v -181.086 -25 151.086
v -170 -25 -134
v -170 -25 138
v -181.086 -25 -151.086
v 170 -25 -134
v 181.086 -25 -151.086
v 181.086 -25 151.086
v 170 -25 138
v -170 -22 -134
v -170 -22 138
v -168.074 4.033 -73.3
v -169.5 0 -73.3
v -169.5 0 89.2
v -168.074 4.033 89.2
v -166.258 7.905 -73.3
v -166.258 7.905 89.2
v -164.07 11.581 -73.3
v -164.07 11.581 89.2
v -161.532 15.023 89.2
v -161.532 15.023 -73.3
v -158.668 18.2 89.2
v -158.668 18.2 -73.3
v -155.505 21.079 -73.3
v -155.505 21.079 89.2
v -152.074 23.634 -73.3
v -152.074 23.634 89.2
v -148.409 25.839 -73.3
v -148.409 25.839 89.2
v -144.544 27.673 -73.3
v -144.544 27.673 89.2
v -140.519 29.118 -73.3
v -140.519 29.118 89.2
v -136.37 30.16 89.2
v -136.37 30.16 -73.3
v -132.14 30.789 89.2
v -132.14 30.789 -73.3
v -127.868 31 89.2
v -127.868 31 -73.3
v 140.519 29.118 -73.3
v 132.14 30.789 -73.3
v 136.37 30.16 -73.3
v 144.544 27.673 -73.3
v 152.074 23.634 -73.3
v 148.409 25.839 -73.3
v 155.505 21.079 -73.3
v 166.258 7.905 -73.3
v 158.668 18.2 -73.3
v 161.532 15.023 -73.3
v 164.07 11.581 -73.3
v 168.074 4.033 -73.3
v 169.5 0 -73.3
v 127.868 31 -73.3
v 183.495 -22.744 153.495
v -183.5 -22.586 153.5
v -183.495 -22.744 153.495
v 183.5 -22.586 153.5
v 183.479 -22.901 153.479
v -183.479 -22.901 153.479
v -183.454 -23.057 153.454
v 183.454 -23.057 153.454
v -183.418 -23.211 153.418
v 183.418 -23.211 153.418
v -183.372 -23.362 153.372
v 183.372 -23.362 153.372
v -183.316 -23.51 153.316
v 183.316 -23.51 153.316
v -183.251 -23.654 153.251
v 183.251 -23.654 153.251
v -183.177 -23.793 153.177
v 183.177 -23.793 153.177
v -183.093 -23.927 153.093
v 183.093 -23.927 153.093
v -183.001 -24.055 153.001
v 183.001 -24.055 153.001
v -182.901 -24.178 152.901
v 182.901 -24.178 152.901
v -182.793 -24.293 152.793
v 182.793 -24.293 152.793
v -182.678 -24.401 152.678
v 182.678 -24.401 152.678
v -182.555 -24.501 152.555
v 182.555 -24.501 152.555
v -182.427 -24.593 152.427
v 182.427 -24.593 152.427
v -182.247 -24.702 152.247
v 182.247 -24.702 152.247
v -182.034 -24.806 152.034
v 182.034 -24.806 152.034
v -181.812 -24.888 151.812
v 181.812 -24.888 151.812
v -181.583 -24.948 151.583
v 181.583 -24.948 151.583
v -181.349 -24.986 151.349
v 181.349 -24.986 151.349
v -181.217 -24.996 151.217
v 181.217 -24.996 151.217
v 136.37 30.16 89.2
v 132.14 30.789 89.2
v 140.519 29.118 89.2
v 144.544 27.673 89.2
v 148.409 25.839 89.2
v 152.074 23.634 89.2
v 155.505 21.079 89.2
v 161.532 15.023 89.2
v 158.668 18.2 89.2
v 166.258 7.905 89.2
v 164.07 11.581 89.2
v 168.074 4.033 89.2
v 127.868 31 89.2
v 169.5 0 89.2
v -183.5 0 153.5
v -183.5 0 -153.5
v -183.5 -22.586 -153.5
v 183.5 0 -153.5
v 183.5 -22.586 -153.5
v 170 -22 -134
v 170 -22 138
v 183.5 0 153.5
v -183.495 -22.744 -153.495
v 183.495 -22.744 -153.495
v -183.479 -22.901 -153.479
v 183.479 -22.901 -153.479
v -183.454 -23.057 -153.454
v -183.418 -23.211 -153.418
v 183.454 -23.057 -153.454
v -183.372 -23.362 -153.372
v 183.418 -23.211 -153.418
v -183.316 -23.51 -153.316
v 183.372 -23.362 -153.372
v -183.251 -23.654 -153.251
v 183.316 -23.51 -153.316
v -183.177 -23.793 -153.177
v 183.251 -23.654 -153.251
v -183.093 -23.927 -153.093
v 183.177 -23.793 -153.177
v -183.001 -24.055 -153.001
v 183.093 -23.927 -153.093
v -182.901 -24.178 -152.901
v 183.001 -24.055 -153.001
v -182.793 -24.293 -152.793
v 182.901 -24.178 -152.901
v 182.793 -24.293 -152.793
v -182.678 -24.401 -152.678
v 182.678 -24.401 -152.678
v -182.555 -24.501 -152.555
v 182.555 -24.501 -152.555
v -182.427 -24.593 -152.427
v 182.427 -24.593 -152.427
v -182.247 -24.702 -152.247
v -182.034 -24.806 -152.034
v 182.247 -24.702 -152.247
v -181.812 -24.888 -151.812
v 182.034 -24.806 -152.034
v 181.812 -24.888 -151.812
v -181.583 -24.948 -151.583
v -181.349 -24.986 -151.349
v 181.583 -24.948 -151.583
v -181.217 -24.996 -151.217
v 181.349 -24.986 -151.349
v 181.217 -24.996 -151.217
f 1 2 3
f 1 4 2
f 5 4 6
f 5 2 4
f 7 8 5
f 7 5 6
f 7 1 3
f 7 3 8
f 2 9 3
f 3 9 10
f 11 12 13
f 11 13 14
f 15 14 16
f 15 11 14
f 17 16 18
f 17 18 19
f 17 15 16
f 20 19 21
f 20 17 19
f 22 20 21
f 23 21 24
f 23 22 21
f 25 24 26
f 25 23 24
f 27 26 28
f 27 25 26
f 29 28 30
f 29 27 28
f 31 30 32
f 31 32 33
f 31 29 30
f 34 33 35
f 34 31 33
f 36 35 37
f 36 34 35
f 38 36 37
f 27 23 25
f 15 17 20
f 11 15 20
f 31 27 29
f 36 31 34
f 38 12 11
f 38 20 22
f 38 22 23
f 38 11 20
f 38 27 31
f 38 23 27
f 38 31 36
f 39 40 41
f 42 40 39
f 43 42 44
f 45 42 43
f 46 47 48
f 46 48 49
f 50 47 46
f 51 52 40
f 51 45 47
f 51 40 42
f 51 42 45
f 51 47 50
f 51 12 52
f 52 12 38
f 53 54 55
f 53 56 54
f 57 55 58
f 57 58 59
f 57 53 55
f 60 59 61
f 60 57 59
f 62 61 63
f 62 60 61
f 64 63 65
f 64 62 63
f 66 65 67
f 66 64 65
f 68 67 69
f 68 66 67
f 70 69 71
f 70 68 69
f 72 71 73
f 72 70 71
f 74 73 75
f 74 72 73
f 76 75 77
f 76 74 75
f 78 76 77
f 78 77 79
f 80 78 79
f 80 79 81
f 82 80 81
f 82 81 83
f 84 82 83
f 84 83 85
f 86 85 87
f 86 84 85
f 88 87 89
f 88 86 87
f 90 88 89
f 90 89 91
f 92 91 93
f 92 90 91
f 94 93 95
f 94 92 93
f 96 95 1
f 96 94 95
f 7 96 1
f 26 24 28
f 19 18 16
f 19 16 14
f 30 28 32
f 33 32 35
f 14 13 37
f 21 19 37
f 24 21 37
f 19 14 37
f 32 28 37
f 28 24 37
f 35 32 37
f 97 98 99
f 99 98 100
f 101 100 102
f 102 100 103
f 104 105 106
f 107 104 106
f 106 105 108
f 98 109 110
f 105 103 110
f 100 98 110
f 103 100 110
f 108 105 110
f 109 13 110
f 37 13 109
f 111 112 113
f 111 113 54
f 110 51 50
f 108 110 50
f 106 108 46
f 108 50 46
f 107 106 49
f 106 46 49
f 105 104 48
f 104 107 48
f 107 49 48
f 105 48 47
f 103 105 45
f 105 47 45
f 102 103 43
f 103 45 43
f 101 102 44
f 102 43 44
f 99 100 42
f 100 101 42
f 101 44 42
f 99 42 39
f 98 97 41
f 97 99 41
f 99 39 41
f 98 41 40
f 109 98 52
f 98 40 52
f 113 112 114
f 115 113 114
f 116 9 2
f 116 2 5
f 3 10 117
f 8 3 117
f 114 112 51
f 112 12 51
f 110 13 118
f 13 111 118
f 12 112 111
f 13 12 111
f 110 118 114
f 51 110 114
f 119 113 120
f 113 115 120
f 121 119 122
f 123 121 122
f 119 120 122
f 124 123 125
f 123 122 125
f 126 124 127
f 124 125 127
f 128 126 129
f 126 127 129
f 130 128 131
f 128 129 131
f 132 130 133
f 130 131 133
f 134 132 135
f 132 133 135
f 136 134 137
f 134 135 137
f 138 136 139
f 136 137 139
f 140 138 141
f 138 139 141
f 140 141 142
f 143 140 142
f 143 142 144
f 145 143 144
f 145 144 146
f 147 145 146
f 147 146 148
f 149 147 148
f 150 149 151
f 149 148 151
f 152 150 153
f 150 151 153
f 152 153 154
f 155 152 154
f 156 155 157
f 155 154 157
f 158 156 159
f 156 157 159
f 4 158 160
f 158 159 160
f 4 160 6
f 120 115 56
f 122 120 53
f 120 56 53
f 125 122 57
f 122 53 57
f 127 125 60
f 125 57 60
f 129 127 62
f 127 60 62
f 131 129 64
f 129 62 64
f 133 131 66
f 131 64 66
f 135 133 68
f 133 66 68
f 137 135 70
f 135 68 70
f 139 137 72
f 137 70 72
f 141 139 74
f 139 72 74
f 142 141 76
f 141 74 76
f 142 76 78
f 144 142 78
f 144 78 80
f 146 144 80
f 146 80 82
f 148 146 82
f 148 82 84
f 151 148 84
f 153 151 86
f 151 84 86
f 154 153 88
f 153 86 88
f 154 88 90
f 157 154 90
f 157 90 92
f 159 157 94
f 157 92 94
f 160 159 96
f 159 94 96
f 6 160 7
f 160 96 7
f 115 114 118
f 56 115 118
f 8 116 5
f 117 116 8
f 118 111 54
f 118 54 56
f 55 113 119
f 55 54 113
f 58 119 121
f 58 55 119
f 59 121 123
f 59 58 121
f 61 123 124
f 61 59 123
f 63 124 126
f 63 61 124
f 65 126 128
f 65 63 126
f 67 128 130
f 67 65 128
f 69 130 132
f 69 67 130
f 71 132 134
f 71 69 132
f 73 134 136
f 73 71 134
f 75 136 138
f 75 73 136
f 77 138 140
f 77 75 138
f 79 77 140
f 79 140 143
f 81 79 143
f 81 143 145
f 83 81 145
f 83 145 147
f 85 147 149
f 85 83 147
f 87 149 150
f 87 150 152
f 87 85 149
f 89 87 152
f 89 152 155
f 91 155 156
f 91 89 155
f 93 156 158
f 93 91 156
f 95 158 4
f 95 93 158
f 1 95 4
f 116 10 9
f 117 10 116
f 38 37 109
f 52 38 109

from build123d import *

# Parameters (mm, degrees)
F0_W        = 367
F0_H        = 307
F0_W_2      = 340
F0_H_2      = 272
F1_DEPTH    = 25
F2_DEPTH    = 22
F3_R        = 2.4142135624
F4_W        = 339
F4_H        = 162.5
F5_DEPTH    = 31
F6_T1_DEPTH = 370.6623366275


# Not quite as in the source:
# - a fillet or chamfer that OpenCascade refuses, or shapes differently, is made with other operations: its cross-section is extruded or revolved along the edge and cut away or added


with BuildPart() as f1:
    # F0 (on Front) → F1 (new body)
    with BuildSketch(Plane.XZ):
        Rectangle(F0_W, F0_H)
        with Locations((0, 2)):
            Rectangle(F0_W_2, F0_H_2, mode=Mode.SUBTRACT)
    extrude(amount=F1_DEPTH)

    # F0 (on Front) → F2 (join)
    with BuildSketch(Plane.XZ):
        with Locations((0, 2)):
            Rectangle(F0_W_2, F0_H_2)
    extrude(amount=F2_DEPTH)

    # F3
    f3_edges = [f1.edges().sort_by_distance(p)[0] for p in [
        (-183.5, -25, 0),
        (183.5, -25, 0),
        (0, -25, 153.5),
        (0, -25, -153.5),
    ]]
    fillet(f3_edges, radius=F3_R)

    # F4 (on face) → F5 (join)
    with BuildSketch(Plane.XZ):
        with Locations((0, 7.95)):
            Rectangle(F4_W, F4_H)
    extrude(amount=-F5_DEPTH)

    # F6: fillet of radius 43.4558441227 on 2 edges, made by hand

    # F6_s2 → F6_t1 (cut)
    with BuildSketch(Plane.XY.offset(-177.3811683137)):
        with BuildLine():
            ThreePointArc((169.5, 0), (153.820674756, 22.3987797386), (127.8675326745, 31))
            Line((127.8675326745, 31), (169.5, 31))
            Line((169.5, 31), (169.5, 0))
        make_face()
        with BuildLine():
            ThreePointArc((-169.5, 0), (-153.820674756, 22.3987797386), (-127.8675326745, 31))
            Line((-127.8675326745, 31), (-169.5, 31))
            Line((-169.5, 31), (-169.5, 0))
        make_face()
    extrude(amount=F6_T1_DEPTH, mode=Mode.SUBTRACT)


solid = f1.part
